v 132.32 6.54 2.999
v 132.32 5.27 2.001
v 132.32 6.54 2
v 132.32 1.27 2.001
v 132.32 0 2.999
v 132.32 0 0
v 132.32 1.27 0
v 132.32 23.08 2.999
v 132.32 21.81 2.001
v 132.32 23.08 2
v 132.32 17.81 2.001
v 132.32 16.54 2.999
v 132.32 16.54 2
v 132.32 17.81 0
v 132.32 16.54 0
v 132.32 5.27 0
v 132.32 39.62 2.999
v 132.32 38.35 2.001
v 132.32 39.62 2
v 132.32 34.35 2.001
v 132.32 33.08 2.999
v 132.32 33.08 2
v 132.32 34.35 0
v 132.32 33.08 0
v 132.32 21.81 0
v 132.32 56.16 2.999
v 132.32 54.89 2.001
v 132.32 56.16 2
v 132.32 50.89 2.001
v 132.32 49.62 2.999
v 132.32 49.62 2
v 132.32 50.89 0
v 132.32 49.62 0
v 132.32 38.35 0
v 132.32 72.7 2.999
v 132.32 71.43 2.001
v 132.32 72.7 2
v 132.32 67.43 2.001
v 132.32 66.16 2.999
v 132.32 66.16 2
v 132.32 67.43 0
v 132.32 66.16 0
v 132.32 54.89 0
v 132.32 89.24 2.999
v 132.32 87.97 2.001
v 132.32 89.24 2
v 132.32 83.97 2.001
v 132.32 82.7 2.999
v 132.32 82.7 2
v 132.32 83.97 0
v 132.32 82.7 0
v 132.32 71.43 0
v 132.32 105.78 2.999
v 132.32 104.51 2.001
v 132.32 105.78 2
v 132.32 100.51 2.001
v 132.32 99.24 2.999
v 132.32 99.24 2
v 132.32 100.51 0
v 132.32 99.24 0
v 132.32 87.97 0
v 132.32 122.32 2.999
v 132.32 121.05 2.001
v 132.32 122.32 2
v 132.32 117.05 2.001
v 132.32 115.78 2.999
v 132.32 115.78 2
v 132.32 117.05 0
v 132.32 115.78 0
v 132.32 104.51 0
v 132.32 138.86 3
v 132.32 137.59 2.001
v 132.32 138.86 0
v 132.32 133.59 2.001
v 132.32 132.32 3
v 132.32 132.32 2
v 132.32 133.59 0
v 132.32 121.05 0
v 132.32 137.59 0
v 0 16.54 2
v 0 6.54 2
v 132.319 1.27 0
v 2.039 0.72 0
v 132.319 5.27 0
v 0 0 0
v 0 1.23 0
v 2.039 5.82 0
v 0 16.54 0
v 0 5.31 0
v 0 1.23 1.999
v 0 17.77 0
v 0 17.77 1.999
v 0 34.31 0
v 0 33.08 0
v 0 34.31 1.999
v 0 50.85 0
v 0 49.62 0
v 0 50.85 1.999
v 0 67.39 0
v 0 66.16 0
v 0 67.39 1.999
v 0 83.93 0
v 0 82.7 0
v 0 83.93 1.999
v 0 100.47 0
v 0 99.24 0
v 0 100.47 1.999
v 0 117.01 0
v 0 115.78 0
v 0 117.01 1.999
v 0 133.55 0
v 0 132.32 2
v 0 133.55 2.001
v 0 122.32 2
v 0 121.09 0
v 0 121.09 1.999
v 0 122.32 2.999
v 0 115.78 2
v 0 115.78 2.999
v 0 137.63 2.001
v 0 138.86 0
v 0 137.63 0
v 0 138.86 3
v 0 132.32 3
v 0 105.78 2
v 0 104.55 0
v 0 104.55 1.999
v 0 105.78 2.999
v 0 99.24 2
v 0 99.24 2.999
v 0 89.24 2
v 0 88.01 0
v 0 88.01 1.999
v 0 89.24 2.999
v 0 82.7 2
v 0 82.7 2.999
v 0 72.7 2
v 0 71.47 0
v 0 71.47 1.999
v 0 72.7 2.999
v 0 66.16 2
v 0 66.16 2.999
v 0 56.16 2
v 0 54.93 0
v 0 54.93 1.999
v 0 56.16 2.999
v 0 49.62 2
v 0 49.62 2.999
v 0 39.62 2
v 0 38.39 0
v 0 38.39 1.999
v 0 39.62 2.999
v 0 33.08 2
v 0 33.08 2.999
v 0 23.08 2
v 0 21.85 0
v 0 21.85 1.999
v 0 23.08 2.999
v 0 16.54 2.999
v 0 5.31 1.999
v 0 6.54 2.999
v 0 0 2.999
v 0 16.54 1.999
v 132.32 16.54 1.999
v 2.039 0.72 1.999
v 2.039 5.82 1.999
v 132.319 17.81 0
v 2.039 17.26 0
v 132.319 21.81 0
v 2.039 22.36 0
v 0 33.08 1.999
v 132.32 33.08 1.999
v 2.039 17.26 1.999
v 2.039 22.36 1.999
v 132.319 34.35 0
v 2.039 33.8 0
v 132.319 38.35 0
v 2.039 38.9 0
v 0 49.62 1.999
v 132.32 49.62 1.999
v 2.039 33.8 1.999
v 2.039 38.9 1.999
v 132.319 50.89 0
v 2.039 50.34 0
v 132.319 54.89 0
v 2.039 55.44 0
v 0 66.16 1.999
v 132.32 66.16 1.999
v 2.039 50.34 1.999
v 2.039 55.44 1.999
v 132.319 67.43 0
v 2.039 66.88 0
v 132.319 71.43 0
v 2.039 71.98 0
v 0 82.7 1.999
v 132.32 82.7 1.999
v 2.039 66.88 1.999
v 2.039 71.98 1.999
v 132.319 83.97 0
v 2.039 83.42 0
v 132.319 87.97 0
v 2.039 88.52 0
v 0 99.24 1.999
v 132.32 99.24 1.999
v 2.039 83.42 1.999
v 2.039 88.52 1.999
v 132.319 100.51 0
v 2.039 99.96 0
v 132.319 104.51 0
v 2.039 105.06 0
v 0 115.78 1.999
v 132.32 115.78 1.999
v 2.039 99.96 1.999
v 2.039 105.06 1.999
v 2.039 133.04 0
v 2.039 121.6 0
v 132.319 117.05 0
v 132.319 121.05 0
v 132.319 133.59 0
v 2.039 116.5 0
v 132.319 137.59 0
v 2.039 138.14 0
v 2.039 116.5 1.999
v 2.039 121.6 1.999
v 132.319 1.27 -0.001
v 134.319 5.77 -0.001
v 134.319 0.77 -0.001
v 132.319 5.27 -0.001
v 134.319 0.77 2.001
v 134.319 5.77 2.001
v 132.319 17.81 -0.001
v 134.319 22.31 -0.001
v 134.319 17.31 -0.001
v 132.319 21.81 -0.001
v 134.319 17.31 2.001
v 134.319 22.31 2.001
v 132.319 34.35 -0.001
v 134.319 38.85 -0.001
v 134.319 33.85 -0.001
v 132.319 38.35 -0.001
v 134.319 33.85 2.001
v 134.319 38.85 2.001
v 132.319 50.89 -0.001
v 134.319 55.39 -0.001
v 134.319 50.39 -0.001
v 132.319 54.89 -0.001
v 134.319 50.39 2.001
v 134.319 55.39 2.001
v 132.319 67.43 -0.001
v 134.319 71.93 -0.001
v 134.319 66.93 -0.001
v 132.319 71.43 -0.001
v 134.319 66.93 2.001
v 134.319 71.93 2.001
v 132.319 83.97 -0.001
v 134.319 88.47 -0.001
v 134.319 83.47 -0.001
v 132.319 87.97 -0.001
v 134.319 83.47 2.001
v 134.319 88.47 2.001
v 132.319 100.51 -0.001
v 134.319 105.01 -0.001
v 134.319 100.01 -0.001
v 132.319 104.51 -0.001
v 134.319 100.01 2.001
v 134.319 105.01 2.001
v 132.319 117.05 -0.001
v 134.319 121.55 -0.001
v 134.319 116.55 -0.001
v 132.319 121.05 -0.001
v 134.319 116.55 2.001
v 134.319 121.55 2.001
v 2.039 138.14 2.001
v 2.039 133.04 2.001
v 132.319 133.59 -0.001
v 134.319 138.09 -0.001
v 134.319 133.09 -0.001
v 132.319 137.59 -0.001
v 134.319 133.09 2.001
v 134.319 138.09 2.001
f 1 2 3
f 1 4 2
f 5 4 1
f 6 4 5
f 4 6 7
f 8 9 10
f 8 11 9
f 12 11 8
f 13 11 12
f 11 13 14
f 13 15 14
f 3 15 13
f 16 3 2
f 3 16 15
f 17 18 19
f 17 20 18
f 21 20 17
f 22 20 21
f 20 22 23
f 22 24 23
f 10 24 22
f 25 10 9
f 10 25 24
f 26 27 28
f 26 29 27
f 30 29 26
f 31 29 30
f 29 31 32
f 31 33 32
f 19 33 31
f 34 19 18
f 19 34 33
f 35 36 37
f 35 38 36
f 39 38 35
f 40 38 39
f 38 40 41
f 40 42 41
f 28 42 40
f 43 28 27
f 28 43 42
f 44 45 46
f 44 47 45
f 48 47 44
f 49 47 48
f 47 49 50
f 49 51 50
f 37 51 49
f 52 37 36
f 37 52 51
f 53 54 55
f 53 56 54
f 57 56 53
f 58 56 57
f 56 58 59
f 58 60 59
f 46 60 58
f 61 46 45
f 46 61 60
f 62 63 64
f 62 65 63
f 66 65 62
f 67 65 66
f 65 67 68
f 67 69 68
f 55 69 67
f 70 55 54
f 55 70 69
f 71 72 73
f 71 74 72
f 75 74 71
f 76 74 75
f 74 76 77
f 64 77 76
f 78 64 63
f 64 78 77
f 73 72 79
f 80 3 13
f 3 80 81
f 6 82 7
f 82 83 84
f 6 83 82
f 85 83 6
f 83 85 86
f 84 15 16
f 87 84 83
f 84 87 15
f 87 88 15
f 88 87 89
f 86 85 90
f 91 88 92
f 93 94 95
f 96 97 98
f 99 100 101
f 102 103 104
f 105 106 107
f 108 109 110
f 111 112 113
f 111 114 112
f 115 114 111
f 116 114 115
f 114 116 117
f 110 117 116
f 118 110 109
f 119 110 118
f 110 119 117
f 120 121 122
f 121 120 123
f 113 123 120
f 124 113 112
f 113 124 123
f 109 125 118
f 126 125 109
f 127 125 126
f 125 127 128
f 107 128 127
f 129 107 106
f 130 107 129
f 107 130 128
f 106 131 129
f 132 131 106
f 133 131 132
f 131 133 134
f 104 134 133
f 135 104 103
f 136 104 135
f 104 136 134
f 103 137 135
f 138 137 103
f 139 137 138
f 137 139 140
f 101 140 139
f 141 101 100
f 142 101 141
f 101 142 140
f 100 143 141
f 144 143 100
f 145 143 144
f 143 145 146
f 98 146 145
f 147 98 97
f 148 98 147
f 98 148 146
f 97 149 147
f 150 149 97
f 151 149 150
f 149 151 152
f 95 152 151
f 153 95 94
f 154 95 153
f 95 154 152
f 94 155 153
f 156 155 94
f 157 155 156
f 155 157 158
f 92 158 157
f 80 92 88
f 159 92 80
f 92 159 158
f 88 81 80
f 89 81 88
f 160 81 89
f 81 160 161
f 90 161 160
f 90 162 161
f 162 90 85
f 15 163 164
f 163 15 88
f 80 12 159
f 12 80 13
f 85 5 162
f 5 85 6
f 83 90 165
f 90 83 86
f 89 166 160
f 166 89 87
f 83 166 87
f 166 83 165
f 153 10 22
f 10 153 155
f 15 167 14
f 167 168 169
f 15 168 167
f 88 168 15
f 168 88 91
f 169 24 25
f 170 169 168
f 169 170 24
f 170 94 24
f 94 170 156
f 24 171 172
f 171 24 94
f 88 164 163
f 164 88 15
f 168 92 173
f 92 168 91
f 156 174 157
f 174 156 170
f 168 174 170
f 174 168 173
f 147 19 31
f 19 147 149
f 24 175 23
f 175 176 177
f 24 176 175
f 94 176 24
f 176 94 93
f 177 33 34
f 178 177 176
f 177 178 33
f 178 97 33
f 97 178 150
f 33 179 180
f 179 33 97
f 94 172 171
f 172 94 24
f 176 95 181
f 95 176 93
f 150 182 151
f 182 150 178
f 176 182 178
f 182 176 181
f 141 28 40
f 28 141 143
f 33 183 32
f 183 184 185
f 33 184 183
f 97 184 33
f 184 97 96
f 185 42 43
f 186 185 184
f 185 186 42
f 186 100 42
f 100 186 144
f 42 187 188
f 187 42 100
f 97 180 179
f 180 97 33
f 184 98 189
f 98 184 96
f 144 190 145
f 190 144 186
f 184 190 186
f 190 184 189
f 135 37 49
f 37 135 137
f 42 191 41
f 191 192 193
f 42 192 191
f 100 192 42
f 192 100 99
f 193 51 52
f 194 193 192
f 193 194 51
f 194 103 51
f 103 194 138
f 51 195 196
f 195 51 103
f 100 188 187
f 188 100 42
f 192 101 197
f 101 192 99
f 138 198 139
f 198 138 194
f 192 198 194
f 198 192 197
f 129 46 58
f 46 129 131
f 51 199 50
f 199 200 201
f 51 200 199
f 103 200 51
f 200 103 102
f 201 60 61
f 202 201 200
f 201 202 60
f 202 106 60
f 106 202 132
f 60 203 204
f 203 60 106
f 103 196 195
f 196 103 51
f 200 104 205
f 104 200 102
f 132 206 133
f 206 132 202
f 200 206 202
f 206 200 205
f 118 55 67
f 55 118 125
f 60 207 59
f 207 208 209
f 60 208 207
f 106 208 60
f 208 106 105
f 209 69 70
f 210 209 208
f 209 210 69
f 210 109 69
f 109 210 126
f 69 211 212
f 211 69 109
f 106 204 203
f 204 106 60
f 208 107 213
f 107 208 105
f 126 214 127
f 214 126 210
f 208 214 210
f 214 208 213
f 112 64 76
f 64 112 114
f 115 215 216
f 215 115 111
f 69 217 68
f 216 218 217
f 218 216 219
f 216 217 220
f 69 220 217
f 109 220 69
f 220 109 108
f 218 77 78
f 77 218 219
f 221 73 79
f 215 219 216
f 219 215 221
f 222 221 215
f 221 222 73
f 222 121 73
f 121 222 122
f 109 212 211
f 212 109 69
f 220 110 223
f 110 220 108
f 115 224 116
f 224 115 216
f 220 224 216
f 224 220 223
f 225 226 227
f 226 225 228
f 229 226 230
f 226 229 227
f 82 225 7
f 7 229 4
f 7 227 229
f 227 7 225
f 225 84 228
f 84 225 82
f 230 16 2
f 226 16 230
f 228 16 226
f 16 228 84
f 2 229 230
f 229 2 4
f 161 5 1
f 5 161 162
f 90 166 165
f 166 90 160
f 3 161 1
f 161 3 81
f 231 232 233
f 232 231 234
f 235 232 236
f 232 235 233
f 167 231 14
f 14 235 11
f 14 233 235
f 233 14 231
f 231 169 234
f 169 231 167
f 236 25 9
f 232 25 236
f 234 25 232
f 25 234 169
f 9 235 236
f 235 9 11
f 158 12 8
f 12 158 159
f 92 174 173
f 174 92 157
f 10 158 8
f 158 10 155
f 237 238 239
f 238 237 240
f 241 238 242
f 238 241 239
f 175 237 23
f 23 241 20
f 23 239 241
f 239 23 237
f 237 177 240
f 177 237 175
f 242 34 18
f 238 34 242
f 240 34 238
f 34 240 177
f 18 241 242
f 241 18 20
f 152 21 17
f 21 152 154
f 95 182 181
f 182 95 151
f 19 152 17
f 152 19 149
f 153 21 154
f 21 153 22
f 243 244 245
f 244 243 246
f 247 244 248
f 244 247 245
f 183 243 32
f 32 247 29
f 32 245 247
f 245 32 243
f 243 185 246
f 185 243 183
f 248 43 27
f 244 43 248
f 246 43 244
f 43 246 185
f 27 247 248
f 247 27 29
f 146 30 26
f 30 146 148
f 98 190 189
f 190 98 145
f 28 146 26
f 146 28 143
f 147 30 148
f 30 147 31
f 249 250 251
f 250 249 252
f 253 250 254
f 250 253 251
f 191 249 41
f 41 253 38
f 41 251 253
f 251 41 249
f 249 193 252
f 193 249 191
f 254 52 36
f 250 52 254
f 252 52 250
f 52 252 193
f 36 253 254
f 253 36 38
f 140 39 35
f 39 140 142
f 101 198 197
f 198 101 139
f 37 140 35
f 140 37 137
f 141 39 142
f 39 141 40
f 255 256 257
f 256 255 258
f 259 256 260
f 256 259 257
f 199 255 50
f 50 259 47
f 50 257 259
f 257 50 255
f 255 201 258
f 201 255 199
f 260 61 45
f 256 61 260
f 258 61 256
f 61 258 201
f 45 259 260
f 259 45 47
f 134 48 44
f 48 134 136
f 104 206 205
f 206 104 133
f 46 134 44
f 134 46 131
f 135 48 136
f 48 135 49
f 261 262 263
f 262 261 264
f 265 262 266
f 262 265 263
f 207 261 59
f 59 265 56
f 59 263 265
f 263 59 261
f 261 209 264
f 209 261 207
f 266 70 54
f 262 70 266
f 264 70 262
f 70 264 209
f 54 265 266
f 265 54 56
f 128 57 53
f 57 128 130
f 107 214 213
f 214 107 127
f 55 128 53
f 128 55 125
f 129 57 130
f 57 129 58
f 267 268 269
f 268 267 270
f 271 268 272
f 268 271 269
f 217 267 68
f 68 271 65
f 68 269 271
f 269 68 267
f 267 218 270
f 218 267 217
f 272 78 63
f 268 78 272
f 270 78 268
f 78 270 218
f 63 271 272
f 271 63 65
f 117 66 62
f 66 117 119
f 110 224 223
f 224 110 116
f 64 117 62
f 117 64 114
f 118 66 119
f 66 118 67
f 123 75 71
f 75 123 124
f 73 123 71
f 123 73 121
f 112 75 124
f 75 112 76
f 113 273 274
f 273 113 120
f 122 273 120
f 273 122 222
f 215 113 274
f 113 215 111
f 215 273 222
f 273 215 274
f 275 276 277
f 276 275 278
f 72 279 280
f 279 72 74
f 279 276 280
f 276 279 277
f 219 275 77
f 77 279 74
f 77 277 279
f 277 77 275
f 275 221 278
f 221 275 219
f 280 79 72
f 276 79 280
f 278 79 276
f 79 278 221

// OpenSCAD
overlap = 0.001;
dovetail_bottom = 4;
dovetail_negative_scale = 1.02;
strip_width = 10;
led_spacing = 16.54;
panel_thickness = 2;
pixels = 8;

module dovetail(scale=1, height=panel_thickness+2*overlap) {
    length = 2 * scale;
    top = 5 * scale;
    bottom = 4 * scale;
    linear_extrude(height=height)
        polygon(points=[
            [0, 0],
            [length, (top-bottom)/2],
            [length, -(bottom + (top-bottom)/2)],
            [0, -bottom]
        ]);
}

for (i = [0 : pixels-1]) {
    translate([0, i*led_spacing, 0])
        difference() {
            cube([pixels * led_spacing, led_spacing, panel_thickness]);
            translate([-overlap, (led_spacing - strip_width + dovetail_bottom * dovetail_negative_scale) / 2, -overlap])
                dovetail(scale=dovetail_negative_scale);
        };
    
    translate([pixels * led_spacing-overlap, (led_spacing - strip_width + dovetail_bottom) / 2 + i*led_spacing, -overlap])
                dovetail(scale=1);
    
    translate([0, i*led_spacing, panel_thickness-overlap])
        cube([pixels * led_spacing, led_spacing-strip_width, panel_thickness/2]);
}

difference() {
    translate([0, pixels*led_spacing, 0])
        cube([pixels * led_spacing, led_spacing-strip_width, panel_thickness*1.5]);
    translate([-overlap, (led_spacing - strip_width + dovetail_bottom * dovetail_negative_scale) / 2 + pixels*led_spacing, -overlap])
        dovetail(scale=dovetail_negative_scale);
}

translate([pixels * led_spacing-overlap, (led_spacing - strip_width + dovetail_bottom) / 2 + pixels*led_spacing, -overlap])
    dovetail(scale=1);
